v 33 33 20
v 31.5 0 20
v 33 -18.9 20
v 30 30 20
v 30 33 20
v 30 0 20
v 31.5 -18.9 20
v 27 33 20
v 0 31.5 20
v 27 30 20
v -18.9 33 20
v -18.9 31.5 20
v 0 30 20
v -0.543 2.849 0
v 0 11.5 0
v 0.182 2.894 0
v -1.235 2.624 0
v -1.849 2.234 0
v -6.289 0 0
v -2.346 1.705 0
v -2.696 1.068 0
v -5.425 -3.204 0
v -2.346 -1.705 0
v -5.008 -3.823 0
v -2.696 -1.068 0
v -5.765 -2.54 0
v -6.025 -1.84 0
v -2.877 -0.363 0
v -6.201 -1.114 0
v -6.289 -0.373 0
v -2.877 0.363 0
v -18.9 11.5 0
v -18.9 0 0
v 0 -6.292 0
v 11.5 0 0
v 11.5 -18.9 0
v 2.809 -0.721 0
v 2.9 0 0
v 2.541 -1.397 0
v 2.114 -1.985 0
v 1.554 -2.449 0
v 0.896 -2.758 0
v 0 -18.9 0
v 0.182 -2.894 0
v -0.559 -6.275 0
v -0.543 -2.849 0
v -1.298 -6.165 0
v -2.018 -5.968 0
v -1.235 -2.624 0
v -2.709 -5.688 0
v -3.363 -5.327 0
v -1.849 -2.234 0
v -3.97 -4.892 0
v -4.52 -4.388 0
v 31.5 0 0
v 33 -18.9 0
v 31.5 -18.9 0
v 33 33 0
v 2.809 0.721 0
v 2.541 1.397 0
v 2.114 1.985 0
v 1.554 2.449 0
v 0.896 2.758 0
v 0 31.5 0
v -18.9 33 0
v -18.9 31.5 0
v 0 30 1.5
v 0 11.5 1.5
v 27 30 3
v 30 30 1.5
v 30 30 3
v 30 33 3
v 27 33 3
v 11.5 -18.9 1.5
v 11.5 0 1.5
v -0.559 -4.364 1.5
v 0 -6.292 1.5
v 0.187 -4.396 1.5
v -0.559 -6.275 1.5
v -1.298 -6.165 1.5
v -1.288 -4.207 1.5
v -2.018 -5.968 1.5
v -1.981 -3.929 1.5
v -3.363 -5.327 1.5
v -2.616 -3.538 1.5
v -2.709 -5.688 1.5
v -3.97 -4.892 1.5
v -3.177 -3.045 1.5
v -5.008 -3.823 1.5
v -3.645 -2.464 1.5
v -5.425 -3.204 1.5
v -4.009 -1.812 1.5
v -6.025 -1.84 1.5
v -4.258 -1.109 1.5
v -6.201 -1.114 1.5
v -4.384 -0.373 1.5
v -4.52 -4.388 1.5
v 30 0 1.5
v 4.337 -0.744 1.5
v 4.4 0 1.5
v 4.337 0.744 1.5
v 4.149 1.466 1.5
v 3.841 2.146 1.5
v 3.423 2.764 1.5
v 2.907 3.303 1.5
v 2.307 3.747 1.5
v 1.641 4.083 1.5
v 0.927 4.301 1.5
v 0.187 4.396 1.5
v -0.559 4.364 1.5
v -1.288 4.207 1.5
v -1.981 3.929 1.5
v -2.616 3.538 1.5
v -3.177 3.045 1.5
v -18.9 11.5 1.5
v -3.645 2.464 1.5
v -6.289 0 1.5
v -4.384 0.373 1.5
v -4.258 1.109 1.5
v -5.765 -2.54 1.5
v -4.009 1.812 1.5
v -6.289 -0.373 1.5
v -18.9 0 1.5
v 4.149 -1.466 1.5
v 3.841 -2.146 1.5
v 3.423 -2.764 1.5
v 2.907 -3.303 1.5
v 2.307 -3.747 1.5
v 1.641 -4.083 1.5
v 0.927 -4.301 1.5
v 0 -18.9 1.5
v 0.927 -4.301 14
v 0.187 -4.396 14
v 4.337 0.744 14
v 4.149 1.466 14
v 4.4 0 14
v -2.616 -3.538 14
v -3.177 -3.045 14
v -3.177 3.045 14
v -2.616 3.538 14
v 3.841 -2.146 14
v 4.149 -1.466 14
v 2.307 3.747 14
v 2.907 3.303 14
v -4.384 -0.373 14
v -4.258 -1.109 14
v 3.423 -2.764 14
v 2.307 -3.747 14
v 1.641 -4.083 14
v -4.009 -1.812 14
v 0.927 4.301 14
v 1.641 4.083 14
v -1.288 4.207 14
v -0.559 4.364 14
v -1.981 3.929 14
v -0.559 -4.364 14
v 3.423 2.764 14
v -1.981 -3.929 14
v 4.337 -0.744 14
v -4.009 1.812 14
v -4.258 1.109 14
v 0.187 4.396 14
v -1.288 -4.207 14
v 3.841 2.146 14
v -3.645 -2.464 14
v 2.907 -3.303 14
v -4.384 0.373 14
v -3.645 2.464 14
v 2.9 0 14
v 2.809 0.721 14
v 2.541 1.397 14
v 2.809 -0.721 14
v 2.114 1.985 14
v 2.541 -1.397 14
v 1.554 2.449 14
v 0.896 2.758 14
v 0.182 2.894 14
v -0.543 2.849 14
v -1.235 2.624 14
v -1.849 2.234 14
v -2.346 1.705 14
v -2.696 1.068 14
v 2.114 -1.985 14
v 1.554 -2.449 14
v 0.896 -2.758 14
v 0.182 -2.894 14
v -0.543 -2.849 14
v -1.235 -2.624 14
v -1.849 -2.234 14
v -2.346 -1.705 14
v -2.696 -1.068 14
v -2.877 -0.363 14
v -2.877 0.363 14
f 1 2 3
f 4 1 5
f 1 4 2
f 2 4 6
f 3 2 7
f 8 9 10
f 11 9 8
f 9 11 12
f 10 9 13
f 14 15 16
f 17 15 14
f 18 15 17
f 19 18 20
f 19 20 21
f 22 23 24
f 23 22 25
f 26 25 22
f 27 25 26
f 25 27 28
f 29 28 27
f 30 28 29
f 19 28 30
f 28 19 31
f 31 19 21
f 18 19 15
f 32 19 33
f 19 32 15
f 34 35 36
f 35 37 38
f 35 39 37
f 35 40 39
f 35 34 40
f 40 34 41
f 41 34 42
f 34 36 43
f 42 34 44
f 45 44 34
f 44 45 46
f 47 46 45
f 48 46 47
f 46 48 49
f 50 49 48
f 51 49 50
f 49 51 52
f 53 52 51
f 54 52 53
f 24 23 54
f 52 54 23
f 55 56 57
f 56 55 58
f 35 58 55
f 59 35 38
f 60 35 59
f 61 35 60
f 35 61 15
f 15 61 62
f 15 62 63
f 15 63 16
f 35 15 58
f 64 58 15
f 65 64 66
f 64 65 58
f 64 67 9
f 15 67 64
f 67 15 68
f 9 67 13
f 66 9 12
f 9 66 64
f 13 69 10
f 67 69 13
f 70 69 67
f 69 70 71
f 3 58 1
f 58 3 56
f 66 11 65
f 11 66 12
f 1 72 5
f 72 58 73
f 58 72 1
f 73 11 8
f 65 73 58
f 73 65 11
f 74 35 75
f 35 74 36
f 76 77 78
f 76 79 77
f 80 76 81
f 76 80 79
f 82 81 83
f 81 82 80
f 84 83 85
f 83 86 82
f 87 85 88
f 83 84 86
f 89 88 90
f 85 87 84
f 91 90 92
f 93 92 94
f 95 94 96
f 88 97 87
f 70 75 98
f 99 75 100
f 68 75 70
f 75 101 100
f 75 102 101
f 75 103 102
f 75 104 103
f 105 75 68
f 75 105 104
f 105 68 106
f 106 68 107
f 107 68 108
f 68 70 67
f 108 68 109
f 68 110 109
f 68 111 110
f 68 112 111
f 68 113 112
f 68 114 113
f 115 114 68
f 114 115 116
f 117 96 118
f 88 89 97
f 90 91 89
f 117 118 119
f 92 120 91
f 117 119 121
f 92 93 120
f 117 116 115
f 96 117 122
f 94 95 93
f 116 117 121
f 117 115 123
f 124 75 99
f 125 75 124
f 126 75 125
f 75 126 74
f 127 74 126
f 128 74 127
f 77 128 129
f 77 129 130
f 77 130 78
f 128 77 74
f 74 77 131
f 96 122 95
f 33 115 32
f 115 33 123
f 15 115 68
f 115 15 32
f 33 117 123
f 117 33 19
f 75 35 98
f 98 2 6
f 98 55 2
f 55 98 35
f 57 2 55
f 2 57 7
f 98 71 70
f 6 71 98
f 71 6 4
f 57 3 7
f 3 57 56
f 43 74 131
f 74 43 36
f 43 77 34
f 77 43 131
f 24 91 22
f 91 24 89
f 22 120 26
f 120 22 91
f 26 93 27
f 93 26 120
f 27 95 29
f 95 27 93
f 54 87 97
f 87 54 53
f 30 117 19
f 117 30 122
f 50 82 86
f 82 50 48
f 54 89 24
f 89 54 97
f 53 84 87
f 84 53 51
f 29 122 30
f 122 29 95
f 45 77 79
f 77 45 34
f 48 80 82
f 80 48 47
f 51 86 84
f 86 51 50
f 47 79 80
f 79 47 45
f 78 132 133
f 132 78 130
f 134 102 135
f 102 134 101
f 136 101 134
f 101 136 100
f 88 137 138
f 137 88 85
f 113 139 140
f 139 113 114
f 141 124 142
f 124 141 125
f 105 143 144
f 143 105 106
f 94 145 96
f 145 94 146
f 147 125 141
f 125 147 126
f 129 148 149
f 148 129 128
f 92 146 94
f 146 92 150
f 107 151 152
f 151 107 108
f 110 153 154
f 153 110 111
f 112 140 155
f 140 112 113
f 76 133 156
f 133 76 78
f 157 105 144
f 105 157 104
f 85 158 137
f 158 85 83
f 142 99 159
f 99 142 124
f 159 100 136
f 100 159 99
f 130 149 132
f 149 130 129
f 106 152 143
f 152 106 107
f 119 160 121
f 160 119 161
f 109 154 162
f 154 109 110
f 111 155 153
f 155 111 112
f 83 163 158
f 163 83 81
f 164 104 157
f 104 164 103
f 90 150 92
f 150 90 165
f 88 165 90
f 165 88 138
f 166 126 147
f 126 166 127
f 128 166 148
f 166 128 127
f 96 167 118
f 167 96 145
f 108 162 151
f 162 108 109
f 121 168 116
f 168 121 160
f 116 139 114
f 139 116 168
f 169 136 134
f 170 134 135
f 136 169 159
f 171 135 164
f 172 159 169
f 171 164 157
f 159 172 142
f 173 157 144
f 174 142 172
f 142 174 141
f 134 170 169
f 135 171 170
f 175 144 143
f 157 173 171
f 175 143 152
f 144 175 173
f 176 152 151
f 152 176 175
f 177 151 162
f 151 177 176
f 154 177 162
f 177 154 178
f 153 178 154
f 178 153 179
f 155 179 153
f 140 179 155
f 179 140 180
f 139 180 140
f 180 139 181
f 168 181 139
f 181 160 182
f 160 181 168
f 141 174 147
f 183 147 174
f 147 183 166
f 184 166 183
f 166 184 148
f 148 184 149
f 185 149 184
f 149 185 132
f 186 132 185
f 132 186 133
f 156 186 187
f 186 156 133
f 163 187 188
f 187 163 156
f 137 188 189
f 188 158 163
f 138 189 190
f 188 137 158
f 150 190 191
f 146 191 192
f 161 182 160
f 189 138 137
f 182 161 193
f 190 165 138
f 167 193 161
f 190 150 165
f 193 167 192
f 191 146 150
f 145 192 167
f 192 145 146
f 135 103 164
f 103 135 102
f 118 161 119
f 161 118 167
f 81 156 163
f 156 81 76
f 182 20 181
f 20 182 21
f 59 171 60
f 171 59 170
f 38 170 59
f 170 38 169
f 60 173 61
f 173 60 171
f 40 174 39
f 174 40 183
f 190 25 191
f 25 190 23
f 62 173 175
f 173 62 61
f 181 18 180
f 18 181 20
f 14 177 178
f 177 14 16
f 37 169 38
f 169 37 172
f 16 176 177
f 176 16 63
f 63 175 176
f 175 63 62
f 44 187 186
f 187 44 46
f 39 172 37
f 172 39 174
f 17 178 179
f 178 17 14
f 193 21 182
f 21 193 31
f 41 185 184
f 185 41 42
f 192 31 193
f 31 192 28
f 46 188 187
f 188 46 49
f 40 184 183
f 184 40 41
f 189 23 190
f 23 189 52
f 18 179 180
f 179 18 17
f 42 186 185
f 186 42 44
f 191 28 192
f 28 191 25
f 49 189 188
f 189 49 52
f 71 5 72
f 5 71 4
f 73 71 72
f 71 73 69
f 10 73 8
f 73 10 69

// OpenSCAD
$fa = 4;
$fs = .75;

stripeThickness = 3;
stripeWidth = 10;

blindThickness = 1.5;
blindSize = 20;

glassThickness = 6;

screwRadius = 2.9;

screwCenterEdgeDistance = 30;

gap = 0.4;
halfGap = gap /  2;

screwEdgeDistance = screwCenterEdgeDistance - screwRadius;

thickness = min(
    blindThickness,
    blindSize - blindThickness - glassThickness - stripeWidth);

tubeThickness = 3;

tubeHeight = blindSize - glassThickness;

innerTubeRadius = screwRadius + thickness;
innerTubeDiameter = 2 * innerTubeRadius;

tubeRadius = innerTubeRadius + gap + thickness;
tubeDiameter = tubeRadius * 2;

supportWidth = 2 * blindSize + tubeDiameter;

fixtureHeight = tubeHeight - blindThickness;

cornerSupportOvershoot = 3 * tubeRadius;

echo("thickness", thickness);
echo("tubeRadius", tubeRadius);



module glass() {
    color("lightblue", 0.3)
        translate([0, 0, tubeHeight])
            difference() {
                translate([-screwCenterEdgeDistance, -screwCenterEdgeDistance])
                    cube([2 * screwCenterEdgeDistance, 2 * screwCenterEdgeDistance, glassThickness]);
                
                cylinder(r = screwRadius, h = glassThickness);

            }
}

module blind() {
   
    color("white")
        translate([- screwCenterEdgeDistance, screwCenterEdgeDistance, 0]) {
    
            translate([0, blindThickness -blindSize]) cube([screwCenterEdgeDistance * 2, blindSize, blindThickness]);
            cube([screwCenterEdgeDistance * 2, blindThickness, blindSize]);
        }
    
}

module tube(rI, rO, h) {
    difference() {
        union() {
            children();
            
            cylinder(r = rO, h = h);
        }
        
        cylinder(r = rI, h = h);
    }
}
module base() {
    color("green") {
        tube(screwRadius, innerTubeRadius, tubeHeight) {
            translate([-innerTubeRadius, 0, 0])
                cube([innerTubeDiameter, screwCenterEdgeDistance + blindThickness, blindThickness]);
            
            translate([-innerTubeRadius, screwCenterEdgeDistance, 0])
                cube([innerTubeDiameter, blindThickness, blindSize]);
            
            translate([-innerTubeRadius, screwCenterEdgeDistance - stripeThickness, blindThickness])
                cube([innerTubeDiameter, stripeThickness, thickness]);
            
            translate([supportWidth / -2, screwCenterEdgeDistance + blindThickness, 0])
                cube([supportWidth, thickness, blindSize]);

            translate([supportWidth / -2, 0, 0])
                cube([supportWidth, screwCenterEdgeDistance + blindThickness - blindSize, blindThickness]);
            
            cylinder(r = tubeRadius, h = thickness);
        }
    }
}


module fixture() {
    color("red") {
        translate([0, 0, blindThickness]) {
            difference() {
                tube(innerTubeRadius + gap, tubeRadius, fixtureHeight) {
                    translate([supportWidth / -2, 0, 0])
                        cube([supportWidth, screwCenterEdgeDistance, thickness]);
                    
                    translate([0, screwCenterEdgeDistance - stripeThickness - thickness, 0]) {
                        cylinder(r = thickness, h = fixtureHeight);
                        
                        translate([supportWidth / -2 + thickness, 0, 0])
                            cylinder(r = thickness, h = fixtureHeight);
                        translate([supportWidth / 2 - thickness, 0, 0])
                            cylinder(r = thickness, h = fixtureHeight);
                            
                    }
                }

                translate([-innerTubeRadius, screwCenterEdgeDistance - stripeThickness, 0])
                    cube([innerTubeDiameter, stripeThickness, thickness]);
            }
        }
    }
}

module mirrorCopy(v = [1, -1, 0]) {
    mirror(v) children();
    children();   
}

module cornerBase() {
    color("green") {
        tube(screwRadius, innerTubeRadius, tubeHeight) {
            cylinder(r = tubeRadius, h = thickness);
            
                        
            
            cube([screwCenterEdgeDistance + blindThickness, screwCenterEdgeDistance + blindThickness, blindThickness]);
            
            
            mirrorCopy() {
                
                translate([-cornerSupportOvershoot, 0, 0])
                    cube([cornerSupportOvershoot + screwCenterEdgeDistance - blindSize + blindThickness, screwCenterEdgeDistance - blindSize + blindThickness, blindThickness]);
                
                translate([0, screwCenterEdgeDistance, 0]) {
                    cube([screwCenterEdgeDistance + blindThickness, blindThickness, blindSize]);
                    
                    translate([-cornerSupportOvershoot, blindThickness, 0])
                        cube([screwCenterEdgeDistance + 2 * blindThickness + cornerSupportOvershoot, thickness, blindSize]);
                }
            }
            
        }
    }
}

module cornerFixture() {
    color("red") {
        translate([0, 0, blindThickness]) {
            tube(innerTubeRadius + gap, tubeRadius, fixtureHeight) {
                mirrorCopy() {
                    translate([-cornerSupportOvershoot, 0, 0])
                        cube([screwCenterEdgeDistance + cornerSupportOvershoot, screwCenterEdgeDistance, thickness]);
                    
                        translate([0, screwCenterEdgeDistance - stripeThickness - thickness, 0]) {
                            cylinder(r = thickness, h = fixtureHeight);
                            
                            translate([-cornerSupportOvershoot + thickness, 0, 0])
                                cylinder(r = thickness, h = fixtureHeight);
                            translate([+cornerSupportOvershoot - thickness, 0, 0])
                                cylinder(r = thickness, h = fixtureHeight);
                        }
                }
                
            }
        }
    }
}



module part() {
    base();
    fixture();
}

module cornerPart() {
    !difference() {
        cornerBase();
        translate([screwCenterEdgeDistance - stripeThickness, screwCenterEdgeDistance, blindThickness + thickness])
            cube([stripeThickness, thickness + blindThickness, blindSize]);
    }
    cornerFixture();
}

*part();
cornerPart();
#blind();
#rotate([0, 0, -90]) blind();
*#glass();
